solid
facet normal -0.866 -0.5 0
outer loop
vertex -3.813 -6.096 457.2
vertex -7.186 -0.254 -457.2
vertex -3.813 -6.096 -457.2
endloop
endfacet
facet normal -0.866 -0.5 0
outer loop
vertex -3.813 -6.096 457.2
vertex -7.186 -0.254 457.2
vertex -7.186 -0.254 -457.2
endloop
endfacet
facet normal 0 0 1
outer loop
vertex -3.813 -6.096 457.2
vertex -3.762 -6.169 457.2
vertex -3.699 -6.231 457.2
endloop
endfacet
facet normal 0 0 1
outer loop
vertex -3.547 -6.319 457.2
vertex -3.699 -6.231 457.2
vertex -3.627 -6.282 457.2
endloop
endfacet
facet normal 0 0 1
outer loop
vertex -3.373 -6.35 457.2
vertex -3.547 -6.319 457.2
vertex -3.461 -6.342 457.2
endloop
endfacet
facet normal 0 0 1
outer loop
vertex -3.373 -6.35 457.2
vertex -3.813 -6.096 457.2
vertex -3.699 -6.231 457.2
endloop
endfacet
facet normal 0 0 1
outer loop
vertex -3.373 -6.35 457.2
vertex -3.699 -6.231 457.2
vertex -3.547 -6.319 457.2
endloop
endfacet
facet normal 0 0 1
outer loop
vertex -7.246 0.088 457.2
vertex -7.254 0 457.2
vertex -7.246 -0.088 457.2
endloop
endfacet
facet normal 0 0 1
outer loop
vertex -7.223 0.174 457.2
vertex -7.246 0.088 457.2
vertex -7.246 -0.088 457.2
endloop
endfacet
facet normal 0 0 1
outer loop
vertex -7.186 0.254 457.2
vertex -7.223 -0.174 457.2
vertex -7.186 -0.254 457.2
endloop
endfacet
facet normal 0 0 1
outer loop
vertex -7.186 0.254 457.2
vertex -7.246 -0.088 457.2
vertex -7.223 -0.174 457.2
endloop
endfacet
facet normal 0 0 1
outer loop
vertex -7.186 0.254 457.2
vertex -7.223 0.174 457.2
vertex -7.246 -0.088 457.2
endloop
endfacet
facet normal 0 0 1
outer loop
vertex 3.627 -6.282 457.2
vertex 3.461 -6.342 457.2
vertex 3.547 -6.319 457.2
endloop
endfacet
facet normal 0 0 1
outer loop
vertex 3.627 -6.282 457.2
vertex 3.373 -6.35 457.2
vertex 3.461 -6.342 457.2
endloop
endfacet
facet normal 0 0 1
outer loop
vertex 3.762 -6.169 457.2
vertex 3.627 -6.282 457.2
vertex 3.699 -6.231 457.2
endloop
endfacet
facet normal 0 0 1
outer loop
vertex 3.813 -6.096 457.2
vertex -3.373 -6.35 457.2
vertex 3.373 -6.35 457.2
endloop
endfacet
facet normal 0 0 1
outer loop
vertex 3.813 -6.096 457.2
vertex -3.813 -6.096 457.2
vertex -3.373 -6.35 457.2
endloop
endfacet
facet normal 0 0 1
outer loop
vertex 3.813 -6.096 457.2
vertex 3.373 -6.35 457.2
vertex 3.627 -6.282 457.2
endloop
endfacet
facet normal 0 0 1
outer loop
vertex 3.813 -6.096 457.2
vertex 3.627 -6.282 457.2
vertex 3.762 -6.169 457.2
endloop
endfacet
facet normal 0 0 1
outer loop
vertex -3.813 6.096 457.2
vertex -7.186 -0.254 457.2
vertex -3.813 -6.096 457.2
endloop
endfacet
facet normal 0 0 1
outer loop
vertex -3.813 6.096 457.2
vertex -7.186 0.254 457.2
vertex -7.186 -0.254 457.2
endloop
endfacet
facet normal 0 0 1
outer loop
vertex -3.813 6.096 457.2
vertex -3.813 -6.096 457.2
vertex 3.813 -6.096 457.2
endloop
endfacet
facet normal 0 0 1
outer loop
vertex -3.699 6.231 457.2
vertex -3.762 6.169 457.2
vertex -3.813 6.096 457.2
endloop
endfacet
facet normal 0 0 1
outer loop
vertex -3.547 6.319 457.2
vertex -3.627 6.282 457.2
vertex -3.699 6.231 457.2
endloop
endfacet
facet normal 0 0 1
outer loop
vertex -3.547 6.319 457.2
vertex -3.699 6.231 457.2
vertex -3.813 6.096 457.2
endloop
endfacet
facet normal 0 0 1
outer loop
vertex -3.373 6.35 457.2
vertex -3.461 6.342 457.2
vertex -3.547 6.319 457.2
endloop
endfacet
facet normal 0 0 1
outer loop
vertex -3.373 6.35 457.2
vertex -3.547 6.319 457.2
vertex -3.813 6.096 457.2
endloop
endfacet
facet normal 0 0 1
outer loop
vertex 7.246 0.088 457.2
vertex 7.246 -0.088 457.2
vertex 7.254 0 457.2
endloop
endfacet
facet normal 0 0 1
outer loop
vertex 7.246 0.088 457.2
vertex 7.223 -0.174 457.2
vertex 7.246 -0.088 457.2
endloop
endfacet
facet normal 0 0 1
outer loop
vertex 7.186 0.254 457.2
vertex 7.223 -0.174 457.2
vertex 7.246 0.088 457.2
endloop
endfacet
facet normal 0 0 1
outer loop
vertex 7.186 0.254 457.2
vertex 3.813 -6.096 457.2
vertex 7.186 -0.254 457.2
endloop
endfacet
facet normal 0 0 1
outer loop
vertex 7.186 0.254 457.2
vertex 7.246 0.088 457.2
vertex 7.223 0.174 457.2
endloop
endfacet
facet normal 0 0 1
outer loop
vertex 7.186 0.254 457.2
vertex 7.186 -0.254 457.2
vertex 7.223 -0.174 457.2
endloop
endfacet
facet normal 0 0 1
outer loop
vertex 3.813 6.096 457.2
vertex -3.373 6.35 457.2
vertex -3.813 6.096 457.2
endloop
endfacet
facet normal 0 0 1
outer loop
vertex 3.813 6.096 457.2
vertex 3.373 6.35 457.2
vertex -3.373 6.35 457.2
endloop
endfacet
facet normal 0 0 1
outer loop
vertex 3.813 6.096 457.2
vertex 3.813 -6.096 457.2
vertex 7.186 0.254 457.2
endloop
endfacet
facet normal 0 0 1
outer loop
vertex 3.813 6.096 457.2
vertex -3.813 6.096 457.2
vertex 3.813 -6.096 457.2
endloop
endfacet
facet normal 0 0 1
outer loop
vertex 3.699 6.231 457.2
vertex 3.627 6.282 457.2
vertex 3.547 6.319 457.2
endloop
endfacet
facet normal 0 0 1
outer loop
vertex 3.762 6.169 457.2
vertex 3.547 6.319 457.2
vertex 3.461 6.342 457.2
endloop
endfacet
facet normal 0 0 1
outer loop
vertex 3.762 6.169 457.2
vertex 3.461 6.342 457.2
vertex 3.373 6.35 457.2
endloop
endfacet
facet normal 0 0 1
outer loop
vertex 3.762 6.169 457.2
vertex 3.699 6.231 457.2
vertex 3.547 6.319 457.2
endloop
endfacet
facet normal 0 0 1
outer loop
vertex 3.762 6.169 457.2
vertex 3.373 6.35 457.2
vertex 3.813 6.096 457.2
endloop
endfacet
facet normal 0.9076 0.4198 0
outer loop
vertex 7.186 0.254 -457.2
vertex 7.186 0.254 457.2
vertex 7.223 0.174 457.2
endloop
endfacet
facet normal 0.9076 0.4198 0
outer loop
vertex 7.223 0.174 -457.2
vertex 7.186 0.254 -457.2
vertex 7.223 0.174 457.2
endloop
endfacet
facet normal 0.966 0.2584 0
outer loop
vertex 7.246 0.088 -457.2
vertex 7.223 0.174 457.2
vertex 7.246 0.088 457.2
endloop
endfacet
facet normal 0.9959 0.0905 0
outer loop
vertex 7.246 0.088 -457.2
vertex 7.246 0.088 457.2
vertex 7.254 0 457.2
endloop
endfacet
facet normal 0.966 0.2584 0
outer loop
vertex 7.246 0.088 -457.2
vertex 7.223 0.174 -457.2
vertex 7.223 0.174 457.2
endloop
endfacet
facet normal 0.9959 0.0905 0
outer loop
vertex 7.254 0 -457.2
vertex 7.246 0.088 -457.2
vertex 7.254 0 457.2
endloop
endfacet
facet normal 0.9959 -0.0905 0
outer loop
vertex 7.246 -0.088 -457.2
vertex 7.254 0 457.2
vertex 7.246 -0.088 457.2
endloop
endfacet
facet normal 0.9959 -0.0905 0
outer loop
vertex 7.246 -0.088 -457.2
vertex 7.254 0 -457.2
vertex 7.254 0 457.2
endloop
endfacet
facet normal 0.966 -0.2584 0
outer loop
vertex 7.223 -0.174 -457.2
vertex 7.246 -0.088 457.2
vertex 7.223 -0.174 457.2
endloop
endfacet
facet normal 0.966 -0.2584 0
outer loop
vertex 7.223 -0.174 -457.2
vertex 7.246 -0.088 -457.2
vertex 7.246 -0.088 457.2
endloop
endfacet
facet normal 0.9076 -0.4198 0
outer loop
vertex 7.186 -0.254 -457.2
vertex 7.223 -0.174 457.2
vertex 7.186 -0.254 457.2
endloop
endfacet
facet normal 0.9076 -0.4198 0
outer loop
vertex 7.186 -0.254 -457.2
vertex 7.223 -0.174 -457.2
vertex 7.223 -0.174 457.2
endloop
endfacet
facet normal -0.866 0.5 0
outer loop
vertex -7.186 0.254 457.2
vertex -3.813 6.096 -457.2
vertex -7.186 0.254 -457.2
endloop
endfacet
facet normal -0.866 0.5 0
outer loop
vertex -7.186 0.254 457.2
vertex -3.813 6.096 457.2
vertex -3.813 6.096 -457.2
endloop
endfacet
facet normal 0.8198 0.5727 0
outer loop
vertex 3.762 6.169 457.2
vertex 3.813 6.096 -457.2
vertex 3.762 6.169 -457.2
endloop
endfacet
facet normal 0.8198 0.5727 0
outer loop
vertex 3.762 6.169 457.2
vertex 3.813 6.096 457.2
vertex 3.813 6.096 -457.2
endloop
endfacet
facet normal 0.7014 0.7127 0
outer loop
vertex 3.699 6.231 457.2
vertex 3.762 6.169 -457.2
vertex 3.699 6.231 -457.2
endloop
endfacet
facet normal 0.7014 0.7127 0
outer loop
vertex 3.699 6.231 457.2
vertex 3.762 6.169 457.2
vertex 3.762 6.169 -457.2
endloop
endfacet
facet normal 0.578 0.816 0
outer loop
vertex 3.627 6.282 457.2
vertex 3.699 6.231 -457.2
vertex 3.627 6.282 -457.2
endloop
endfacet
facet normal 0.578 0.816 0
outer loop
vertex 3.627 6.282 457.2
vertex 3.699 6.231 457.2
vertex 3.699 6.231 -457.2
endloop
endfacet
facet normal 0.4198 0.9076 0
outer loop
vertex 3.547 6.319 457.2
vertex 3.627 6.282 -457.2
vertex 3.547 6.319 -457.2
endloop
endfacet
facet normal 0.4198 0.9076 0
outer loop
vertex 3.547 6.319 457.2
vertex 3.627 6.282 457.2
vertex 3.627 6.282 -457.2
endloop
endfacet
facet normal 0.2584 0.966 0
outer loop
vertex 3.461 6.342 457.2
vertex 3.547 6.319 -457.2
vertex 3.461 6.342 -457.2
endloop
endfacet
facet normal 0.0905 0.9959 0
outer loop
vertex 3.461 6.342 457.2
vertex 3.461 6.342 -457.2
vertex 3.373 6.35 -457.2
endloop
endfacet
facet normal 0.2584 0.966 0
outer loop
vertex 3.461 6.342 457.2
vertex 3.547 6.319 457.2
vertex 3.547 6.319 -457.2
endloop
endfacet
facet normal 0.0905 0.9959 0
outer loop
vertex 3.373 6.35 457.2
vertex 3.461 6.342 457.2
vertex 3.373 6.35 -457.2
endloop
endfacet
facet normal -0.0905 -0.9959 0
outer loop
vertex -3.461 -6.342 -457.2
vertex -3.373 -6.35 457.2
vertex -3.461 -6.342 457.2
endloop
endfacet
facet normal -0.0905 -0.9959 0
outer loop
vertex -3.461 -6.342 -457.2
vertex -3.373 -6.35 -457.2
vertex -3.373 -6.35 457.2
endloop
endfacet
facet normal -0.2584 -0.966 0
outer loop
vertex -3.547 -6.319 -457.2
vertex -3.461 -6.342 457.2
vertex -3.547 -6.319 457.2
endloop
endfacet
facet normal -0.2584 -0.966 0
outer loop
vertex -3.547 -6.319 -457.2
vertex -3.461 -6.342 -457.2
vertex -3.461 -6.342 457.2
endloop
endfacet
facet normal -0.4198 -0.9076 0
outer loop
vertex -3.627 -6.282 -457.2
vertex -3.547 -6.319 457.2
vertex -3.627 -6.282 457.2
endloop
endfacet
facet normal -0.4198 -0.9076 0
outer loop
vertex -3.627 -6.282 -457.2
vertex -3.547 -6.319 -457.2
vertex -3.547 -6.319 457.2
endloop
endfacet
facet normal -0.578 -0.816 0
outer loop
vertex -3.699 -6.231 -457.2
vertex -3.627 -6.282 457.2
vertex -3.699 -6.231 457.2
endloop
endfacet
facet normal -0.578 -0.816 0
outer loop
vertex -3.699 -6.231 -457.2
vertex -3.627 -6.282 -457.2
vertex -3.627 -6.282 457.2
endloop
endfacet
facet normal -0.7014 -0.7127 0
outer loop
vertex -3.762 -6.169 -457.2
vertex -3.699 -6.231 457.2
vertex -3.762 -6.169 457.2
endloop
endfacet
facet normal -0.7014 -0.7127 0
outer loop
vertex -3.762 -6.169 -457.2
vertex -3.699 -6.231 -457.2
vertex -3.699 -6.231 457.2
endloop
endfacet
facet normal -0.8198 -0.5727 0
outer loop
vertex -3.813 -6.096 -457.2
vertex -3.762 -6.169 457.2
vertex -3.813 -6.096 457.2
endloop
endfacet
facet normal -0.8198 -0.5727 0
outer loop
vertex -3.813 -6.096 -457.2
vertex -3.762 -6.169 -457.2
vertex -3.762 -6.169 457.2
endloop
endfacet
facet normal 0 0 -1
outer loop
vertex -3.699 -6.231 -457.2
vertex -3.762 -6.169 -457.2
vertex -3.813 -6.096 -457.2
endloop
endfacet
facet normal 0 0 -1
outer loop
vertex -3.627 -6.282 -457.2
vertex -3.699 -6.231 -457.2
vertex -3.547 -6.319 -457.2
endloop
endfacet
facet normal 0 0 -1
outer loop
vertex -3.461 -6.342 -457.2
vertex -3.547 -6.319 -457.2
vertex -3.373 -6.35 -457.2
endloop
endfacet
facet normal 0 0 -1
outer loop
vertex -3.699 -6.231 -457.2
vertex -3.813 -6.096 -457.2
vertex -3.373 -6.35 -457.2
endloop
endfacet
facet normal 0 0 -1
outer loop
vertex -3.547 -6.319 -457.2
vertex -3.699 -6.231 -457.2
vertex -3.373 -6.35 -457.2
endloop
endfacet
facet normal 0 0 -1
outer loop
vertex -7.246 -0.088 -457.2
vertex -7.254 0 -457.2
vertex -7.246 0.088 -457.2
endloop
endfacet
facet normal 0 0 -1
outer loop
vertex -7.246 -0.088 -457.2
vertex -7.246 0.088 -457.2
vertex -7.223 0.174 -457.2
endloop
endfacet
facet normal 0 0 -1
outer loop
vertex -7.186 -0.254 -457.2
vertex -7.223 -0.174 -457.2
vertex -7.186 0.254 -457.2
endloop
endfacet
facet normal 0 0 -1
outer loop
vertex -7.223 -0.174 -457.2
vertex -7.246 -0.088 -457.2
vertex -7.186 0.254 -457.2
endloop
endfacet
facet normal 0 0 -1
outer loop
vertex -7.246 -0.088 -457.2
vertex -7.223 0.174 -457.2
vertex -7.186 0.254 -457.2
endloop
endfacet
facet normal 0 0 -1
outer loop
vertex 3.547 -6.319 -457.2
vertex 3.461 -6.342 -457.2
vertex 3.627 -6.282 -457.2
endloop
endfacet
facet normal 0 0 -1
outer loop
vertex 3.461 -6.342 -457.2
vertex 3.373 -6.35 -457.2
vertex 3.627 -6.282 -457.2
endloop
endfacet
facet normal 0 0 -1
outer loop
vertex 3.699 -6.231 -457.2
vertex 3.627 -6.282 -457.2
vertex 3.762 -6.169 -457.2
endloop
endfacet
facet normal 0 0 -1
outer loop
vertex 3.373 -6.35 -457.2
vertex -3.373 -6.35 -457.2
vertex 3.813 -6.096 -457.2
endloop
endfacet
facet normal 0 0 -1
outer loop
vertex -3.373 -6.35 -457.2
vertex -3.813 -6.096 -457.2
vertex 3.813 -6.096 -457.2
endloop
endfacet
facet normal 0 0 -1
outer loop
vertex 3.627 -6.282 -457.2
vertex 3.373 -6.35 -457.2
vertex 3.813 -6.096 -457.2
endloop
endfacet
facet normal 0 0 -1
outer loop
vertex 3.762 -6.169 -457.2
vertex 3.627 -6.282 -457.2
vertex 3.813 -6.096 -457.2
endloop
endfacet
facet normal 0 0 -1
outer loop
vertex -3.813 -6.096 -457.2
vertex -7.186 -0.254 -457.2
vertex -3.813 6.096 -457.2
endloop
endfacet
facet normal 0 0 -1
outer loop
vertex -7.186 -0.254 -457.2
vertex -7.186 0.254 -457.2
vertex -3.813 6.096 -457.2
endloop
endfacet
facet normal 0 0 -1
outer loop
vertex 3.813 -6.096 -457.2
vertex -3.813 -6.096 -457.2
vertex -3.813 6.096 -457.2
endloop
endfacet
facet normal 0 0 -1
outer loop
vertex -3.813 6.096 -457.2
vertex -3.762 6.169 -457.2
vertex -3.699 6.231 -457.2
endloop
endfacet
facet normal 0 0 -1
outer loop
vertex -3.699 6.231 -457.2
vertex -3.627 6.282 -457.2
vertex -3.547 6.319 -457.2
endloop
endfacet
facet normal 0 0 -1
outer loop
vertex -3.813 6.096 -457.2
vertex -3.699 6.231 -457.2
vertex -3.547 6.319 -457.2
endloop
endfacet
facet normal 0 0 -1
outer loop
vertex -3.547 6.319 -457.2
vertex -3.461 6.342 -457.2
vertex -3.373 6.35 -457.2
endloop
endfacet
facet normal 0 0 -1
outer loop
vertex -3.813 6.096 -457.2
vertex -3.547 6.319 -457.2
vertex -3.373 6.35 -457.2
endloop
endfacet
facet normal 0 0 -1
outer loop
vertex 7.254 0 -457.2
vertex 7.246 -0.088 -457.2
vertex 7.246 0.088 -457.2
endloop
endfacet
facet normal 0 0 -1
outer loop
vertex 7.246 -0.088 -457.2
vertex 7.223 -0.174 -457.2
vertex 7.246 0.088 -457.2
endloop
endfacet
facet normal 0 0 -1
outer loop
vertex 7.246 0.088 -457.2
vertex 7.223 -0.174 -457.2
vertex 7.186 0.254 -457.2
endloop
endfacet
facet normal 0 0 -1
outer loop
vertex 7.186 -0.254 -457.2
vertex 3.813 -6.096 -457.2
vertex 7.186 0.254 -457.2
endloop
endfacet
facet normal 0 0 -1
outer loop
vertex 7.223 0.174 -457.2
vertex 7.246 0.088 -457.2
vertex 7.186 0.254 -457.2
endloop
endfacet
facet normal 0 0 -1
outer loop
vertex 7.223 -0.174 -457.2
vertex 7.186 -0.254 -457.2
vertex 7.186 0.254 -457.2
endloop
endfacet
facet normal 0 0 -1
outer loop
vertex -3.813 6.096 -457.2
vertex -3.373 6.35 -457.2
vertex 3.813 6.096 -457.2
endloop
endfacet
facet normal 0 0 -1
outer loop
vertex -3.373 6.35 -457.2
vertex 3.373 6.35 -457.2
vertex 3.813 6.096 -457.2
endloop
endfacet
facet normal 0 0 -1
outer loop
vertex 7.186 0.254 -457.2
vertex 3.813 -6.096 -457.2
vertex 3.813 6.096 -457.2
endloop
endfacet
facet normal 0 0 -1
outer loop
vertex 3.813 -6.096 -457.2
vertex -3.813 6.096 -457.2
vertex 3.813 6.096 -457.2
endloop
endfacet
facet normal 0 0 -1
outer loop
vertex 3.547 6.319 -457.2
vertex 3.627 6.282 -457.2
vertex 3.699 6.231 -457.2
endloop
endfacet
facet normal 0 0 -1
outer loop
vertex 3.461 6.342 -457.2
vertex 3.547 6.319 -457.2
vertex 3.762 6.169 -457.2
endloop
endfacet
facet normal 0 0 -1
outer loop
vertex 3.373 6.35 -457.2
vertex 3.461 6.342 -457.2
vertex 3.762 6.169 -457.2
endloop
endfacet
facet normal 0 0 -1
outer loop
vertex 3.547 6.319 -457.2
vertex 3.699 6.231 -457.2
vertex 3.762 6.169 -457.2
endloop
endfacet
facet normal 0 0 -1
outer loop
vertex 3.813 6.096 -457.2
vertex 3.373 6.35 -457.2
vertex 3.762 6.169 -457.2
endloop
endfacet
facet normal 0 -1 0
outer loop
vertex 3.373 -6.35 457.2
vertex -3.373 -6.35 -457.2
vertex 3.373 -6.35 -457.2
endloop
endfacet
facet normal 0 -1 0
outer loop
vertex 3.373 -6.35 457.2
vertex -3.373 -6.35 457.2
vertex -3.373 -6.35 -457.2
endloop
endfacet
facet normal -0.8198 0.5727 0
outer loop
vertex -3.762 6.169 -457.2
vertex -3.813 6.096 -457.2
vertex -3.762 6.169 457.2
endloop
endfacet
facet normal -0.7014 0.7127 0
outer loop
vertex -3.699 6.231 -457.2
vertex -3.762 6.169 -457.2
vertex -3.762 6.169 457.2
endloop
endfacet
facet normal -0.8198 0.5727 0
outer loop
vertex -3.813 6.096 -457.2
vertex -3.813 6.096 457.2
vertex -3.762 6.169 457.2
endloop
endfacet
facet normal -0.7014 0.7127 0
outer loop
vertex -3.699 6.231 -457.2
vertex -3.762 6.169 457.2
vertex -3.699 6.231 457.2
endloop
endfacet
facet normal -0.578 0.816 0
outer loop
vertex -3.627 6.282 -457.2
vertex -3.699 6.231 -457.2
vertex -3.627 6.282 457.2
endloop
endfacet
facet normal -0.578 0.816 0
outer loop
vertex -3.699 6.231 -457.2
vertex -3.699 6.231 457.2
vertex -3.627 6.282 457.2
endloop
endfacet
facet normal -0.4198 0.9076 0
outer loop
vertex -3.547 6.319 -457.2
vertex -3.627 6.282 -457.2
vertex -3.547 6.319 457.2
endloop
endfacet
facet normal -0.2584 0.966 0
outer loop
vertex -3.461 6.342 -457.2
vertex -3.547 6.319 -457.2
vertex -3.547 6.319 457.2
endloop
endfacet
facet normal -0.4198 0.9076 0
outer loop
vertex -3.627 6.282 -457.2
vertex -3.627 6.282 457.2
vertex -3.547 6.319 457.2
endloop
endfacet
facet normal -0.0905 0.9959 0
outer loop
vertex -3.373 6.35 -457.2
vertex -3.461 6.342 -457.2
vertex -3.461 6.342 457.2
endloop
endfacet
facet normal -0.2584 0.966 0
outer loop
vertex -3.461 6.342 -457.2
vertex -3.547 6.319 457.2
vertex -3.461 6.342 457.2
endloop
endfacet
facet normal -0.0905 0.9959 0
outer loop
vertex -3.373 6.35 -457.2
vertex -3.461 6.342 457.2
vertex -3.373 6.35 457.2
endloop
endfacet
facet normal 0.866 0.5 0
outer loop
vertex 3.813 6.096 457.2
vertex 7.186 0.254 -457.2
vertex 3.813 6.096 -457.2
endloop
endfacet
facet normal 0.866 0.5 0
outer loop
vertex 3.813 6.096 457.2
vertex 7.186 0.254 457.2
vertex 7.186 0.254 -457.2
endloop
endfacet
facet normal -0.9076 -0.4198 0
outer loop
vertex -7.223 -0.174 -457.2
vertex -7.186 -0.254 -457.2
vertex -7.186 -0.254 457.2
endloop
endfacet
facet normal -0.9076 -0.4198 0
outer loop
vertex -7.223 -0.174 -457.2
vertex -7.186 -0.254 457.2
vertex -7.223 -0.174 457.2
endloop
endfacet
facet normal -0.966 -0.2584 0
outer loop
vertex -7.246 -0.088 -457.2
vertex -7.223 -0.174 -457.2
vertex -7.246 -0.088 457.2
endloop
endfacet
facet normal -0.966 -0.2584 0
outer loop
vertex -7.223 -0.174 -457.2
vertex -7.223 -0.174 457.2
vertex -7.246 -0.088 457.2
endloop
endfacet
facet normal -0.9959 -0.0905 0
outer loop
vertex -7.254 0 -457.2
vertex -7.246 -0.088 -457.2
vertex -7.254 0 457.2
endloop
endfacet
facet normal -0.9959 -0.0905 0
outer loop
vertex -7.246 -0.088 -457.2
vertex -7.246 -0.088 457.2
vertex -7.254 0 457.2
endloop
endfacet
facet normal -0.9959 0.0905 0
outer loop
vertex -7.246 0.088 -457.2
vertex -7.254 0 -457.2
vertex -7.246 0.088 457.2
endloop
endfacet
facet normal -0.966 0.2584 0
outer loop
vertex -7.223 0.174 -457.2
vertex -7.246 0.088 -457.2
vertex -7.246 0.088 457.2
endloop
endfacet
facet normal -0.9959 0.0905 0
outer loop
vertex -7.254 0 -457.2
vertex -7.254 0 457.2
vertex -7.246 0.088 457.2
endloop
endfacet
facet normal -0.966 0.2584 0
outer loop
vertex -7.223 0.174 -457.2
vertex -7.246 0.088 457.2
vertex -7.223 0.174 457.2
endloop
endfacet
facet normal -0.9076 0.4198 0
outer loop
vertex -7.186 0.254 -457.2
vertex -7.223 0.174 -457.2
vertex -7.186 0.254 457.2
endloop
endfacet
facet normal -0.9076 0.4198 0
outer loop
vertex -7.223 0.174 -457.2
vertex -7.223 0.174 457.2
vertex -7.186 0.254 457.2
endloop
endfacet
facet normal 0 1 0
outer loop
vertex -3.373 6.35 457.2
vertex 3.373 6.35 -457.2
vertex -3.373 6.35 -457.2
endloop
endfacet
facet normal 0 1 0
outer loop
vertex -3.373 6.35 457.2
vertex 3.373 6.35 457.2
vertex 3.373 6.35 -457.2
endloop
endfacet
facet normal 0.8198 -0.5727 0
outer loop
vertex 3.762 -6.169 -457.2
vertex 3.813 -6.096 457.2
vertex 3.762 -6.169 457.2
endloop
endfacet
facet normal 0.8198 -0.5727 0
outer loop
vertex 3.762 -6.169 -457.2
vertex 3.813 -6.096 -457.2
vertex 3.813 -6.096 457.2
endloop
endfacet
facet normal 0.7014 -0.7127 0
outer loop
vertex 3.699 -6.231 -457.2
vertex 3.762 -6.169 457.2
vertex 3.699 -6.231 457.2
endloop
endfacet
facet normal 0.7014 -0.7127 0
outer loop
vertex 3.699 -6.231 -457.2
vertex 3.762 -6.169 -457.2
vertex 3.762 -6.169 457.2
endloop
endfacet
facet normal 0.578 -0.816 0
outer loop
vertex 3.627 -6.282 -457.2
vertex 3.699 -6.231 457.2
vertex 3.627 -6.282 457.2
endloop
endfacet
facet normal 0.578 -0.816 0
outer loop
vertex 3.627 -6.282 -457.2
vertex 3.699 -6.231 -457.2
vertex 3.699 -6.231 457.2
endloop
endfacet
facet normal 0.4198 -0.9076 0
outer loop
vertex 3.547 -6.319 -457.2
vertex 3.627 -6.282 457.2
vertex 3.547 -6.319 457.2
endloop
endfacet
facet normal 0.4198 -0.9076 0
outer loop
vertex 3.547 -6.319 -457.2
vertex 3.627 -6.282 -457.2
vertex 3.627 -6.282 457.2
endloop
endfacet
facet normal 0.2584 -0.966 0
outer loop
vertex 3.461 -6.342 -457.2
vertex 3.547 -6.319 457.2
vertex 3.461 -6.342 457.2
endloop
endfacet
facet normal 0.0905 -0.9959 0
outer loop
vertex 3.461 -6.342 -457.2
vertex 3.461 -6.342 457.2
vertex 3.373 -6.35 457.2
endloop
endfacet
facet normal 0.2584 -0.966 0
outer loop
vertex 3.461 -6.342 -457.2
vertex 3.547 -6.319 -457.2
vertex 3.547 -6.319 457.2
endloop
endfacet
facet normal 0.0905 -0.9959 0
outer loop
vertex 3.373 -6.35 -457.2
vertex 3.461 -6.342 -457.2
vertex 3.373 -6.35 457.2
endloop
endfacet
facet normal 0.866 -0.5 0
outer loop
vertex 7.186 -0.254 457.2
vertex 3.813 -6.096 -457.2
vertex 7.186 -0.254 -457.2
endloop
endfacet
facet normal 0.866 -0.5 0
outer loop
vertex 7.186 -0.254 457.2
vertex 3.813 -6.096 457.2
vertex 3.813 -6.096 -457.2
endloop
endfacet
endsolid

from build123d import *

# Parameters (mm, degrees)
BOSS_EXTRUDE1_DEPTH = 457.2
FILLET1_R           = 0.508


with BuildPart() as part:
    # Sketch1 → Boss-Extrude1 (new body, symmetric)
    with BuildSketch(Plane.XY):
        Polygon((7.332348419, 0), (3.666174209, 6.35), (-3.666174209, 6.35), (-7.332348419, 0), (-3.666174209, -6.35), (3.666174209, -6.35), align=None)
    extrude(amount=BOSS_EXTRUDE1_DEPTH, both=True)

    # Fillet1
    fillet1_edges = [part.edges().sort_by_distance(p)[0] for p in [
        (3.666174209, -6.35, 0),
        (-3.666174209, -6.35, 0),
        (-7.332348419, 0, 0),
        (-3.666174209, 6.35, 0),
        (3.666174209, 6.35, 0),
        (7.332348419, 0, 0),
    ]]
    fillet(fillet1_edges, radius=FILLET1_R)


solid = part.part
